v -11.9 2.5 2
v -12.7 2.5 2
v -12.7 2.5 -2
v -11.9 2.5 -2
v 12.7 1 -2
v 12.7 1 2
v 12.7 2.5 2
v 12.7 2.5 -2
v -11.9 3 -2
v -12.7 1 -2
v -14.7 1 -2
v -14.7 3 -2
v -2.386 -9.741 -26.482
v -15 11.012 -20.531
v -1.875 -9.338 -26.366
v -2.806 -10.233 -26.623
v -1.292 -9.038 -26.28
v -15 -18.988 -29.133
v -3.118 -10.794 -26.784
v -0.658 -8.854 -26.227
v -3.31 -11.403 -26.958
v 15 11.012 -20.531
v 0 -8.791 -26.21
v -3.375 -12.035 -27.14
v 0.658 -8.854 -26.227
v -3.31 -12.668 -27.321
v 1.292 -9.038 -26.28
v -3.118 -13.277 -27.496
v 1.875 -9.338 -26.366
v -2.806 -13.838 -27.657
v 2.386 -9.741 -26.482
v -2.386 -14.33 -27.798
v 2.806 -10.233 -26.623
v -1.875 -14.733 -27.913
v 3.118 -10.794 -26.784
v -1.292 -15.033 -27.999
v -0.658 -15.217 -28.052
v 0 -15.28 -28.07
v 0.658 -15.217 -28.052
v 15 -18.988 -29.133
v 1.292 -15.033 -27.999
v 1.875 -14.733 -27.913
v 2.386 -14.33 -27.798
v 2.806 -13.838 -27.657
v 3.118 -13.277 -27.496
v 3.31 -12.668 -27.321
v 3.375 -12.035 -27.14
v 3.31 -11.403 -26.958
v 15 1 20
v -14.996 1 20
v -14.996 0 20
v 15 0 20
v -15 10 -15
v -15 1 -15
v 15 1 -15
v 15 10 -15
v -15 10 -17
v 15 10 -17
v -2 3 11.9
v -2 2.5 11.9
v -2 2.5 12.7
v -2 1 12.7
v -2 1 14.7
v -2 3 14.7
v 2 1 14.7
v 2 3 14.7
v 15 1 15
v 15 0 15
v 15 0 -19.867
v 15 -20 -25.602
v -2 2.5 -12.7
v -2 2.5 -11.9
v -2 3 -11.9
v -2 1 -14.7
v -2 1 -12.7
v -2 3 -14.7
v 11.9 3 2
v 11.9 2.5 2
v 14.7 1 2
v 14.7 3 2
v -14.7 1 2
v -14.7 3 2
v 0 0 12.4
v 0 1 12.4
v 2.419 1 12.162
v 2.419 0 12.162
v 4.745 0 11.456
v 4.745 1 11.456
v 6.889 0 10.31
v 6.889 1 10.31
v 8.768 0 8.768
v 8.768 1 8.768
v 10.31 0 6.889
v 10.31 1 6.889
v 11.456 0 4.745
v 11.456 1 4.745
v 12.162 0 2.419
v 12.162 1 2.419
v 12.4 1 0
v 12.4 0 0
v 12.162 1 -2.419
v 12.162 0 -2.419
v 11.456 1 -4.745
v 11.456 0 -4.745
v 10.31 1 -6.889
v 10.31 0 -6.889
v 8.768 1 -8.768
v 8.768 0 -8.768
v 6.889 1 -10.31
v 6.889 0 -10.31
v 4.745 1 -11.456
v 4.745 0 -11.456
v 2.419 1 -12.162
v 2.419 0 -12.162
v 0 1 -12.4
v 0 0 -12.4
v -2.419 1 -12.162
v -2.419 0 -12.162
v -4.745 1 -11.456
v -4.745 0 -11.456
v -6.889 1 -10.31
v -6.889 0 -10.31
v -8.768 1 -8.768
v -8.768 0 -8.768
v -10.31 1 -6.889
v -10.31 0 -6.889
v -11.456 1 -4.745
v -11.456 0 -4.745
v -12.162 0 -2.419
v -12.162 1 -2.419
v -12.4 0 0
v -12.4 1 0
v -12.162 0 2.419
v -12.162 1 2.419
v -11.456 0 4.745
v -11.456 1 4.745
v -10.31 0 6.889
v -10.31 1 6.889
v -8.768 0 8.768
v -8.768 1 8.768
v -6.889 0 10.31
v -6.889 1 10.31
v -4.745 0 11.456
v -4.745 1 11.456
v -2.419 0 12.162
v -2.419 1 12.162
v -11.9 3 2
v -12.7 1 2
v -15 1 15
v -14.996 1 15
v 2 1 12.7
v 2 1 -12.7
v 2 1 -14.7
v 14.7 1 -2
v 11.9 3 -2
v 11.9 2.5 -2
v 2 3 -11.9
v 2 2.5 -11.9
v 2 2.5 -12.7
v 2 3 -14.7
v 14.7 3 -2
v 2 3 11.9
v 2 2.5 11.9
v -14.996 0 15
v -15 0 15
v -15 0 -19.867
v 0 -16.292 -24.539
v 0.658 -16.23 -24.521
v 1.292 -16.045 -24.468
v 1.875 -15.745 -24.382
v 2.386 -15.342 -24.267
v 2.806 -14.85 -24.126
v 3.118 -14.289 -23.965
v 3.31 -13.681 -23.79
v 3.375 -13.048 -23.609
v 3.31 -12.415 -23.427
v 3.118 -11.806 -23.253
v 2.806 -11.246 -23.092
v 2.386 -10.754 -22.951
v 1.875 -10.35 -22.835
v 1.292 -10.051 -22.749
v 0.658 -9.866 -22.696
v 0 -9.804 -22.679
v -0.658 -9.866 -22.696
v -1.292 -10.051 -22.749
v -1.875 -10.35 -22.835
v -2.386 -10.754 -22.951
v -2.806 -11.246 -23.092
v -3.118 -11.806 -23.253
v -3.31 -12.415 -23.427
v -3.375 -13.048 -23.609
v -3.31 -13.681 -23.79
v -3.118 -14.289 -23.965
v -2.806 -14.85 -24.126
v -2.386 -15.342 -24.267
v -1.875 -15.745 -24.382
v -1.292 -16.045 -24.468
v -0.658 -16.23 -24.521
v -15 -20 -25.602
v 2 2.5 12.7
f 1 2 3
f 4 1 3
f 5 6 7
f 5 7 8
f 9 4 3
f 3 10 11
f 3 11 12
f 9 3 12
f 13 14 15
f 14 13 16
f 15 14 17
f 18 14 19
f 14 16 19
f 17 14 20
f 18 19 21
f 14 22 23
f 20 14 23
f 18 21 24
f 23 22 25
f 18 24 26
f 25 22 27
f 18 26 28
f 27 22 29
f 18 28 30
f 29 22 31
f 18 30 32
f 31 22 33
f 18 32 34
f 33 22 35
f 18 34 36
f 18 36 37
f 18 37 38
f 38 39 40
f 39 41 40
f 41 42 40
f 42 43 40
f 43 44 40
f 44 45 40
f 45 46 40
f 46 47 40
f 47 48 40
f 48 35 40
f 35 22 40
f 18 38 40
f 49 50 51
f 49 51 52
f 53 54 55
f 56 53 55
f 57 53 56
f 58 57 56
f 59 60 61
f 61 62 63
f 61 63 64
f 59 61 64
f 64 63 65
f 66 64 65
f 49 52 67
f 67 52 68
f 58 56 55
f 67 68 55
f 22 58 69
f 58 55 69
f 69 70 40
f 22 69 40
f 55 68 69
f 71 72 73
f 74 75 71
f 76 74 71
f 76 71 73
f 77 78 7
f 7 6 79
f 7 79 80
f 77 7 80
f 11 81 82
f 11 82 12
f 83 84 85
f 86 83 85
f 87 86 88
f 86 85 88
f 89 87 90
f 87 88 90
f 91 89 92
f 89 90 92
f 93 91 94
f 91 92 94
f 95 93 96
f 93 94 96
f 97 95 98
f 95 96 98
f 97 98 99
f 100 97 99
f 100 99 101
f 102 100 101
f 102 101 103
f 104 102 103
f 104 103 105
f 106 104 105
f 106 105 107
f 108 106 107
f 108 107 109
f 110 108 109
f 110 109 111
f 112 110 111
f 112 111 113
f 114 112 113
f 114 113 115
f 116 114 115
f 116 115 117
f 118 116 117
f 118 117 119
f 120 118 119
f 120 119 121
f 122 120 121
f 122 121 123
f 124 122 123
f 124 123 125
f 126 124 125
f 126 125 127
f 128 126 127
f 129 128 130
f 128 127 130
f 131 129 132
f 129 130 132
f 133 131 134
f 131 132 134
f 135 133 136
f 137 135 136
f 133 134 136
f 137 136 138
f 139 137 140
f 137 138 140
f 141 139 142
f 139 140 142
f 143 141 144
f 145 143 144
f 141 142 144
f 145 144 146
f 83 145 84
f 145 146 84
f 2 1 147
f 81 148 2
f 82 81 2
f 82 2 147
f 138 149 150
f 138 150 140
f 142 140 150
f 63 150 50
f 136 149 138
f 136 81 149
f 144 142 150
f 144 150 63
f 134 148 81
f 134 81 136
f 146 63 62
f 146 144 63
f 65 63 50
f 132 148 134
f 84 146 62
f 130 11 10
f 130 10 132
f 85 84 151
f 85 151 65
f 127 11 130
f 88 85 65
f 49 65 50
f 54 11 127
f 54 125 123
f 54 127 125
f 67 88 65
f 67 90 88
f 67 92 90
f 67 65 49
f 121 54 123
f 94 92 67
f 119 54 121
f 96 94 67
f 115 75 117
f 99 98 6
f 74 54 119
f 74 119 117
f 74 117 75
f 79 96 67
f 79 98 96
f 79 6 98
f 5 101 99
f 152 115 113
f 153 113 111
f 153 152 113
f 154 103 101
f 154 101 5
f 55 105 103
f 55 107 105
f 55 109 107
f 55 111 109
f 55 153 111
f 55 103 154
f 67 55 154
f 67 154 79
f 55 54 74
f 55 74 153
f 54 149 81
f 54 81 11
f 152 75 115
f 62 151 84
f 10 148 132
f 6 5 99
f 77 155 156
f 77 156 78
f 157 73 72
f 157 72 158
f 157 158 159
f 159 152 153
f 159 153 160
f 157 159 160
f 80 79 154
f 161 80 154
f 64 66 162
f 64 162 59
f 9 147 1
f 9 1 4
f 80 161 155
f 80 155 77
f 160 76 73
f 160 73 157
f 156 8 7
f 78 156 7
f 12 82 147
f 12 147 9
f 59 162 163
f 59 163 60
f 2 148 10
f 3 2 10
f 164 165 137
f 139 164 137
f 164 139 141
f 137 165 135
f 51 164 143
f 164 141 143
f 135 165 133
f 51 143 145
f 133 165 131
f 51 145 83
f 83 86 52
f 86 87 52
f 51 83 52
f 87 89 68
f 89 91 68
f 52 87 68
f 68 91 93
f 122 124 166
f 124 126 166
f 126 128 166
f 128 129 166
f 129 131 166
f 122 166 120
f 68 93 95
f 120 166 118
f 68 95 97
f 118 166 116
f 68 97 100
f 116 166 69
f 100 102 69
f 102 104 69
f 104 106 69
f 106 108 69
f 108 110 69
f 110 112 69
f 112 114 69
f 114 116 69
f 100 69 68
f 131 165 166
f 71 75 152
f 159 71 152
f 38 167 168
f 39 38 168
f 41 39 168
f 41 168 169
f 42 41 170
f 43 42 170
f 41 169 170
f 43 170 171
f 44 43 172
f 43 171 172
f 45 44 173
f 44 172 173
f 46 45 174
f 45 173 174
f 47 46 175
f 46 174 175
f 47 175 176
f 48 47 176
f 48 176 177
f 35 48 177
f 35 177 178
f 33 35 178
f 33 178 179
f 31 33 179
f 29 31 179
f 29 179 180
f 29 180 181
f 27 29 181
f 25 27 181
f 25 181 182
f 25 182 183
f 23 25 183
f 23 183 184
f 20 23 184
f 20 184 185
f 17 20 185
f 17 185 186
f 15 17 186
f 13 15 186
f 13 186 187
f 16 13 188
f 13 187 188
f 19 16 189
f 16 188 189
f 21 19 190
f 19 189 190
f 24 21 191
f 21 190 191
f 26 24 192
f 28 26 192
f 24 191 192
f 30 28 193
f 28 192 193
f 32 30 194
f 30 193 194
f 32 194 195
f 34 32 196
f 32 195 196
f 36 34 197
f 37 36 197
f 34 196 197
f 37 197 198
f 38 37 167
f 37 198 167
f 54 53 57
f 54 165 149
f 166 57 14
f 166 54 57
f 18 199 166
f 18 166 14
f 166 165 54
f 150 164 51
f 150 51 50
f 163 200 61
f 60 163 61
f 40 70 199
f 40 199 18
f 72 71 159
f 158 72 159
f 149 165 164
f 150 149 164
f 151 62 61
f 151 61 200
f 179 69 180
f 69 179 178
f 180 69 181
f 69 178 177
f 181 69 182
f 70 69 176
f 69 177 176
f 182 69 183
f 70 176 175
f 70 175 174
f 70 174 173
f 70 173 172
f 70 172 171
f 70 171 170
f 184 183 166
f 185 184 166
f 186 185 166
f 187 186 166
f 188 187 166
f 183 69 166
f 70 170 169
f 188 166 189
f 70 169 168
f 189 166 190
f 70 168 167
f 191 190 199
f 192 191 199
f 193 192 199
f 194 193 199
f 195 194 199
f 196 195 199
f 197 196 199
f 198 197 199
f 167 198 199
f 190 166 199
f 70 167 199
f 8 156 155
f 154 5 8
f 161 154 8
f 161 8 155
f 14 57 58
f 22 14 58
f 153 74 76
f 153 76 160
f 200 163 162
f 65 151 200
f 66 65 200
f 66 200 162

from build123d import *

# Parameters (mm, degrees)
SKETCH1_W               = 30
SKETCH1_H               = 30
BOSS_EXTRUDE1_DEPTH     = 1
SKETCH2_R               = 12.4
CUT_EXTRUDE1_DEPTH      = 22.236760582
SKETCH4_W               = 2
SKETCH4_H               = 4
SKETCH4_W_2             = 4
SKETCH4_H_2             = 2
BOSS_EXTRUDE2_DEPTH     = 2
SKETCH5_W               = 4
SKETCH5_H               = 0.5
BOSS_EXTRUDE3_DEPTH     = 0.8
SKETCH6_W               = 4
SKETCH6_H               = 0.5
BOSS_EXTRUDE4_DEPTH     = 0.8
SKETCH7_W               = 4
SKETCH7_H               = 0.5
BOSS_EXTRUDE5_DEPTH     = 0.8
SKETCH8_W               = 4
SKETCH8_H               = 0.5
BOSS_EXTRUDE6_DEPTH     = 0.8
SKETCH11_W              = 38.930666634
SKETCH11_H              = 2
BOSS_EXTRUDE9_DEPTH     = 10
BOSS_EXTRUDE10_DEPTH    = 30
BOSS_EXTRUDE11_DEPTH    = 30
CUT_EXTRUDE2_DEPTH      = 45.684189659
CUT_EXTRUDE2_DEPTH_BACK = 45.684189659
SKETCH14_W              = 8.930666634
SKETCH14_H              = 10
SKETCH15_W              = 29.996322287
SKETCH15_H              = 1
BOSS_EXTRUDE12_DEPTH    = 5
SKETCH20_W              = 30
SKETCH20_H              = 3.6732435
BOSS_EXTRUDE16_DEPTH    = 90
CUT_EXTRUDE3_DEPTH      = 80.886258607
SKETCH23_W              = 30
SKETCH23_H              = 55.569719249
CUT_EXTRUDE5_DEPTH      = 10
SKETCH24_W              = 30
SKETCH24_H              = 3.6732435
BOSS_EXTRUDE17_DEPTH    = 76.2
SKETCH25_W              = 30
SKETCH25_H              = 3.6732435
CUT_EXTRUDE6_DEPTH      = 25.4
SKETCH26_W              = 30
SKETCH26_H              = 3.6732435
BOSS_EXTRUDE18_DEPTH    = 17.8
SKETCH27_W              = 30
SKETCH27_H              = 71.821297676
CUT_EXTRUDE7_DEPTH      = 10
SKETCH28_R              = 3.375
CUT_EXTRUDE8_DEPTH      = 10


with BuildPart() as part:
    # Sketch1 → Boss-Extrude1 (new body)
    with BuildSketch(Plane(origin=(0, 0, 0), x_dir=(1, 0, 0), z_dir=(0, 1, 0))):
        Rectangle(SKETCH1_W, SKETCH1_H)
    extrude(amount=BOSS_EXTRUDE1_DEPTH)

    # Sketch2 → Cut-Extrude1 (cut, through all)
    with BuildSketch(Plane(origin=(0, 1, 0), x_dir=(1, 0, 0), z_dir=(0, 1, 0))):
        with Locations(Location((0, 0, 0), (0, 0, 270))):
            Circle(SKETCH2_R)
    extrude(amount=-CUT_EXTRUDE1_DEPTH, mode=Mode.SUBTRACT)

    # Sketch4 → Boss-Extrude2 (add)
    with BuildSketch(Plane(origin=(0, 1, 0), x_dir=(1, 0, 0), z_dir=(0, 1, 0))):
        with Locations((13.7, 0)):
            Rectangle(SKETCH4_W, SKETCH4_H)
        with Locations((-13.7, 0)):
            Rectangle(SKETCH4_W, SKETCH4_H)
        with Locations((0, 13.7)):
            Rectangle(SKETCH4_W_2, SKETCH4_H_2)
        with Locations((0, -13.7)):
            Rectangle(SKETCH4_W_2, SKETCH4_H_2)
    extrude(amount=BOSS_EXTRUDE2_DEPTH)

    # Sketch5 → Boss-Extrude3 (add)
    with BuildSketch(Plane.ZY.offset(-12.7)):
        with Locations((0, 2.75)):
            Rectangle(SKETCH5_W, SKETCH5_H)
    extrude(amount=BOSS_EXTRUDE3_DEPTH)

    # Sketch6 → Boss-Extrude4 (add)
    with BuildSketch(Plane(origin=(0, 0, 12.7), x_dir=(-1, 0, 0), z_dir=(0, 0, -1))):
        with Locations((0, 2.75)):
            Rectangle(SKETCH6_W, SKETCH6_H)
    extrude(amount=BOSS_EXTRUDE4_DEPTH)

    # Sketch7 → Boss-Extrude5 (add)
    with BuildSketch(Plane(origin=(-12.7, 0, 0), x_dir=(0, 0, -1), z_dir=(1, 0, 0))):
        with Locations((0, 2.75)):
            Rectangle(SKETCH7_W, SKETCH7_H)
    extrude(amount=BOSS_EXTRUDE5_DEPTH)

    # Sketch8 → Boss-Extrude6 (add)
    with BuildSketch(Plane.XY.offset(-12.7)):
        with Locations((0, 2.75)):
            Rectangle(SKETCH8_W, SKETCH8_H)
    extrude(amount=BOSS_EXTRUDE6_DEPTH)

    # Sketch11 → Boss-Extrude9 (add)
    with BuildSketch(Plane.XZ):
        with Locations((4.465333317, -16)):
            Rectangle(SKETCH11_W, SKETCH11_H)
    extrude(amount=-BOSS_EXTRUDE9_DEPTH)



with BuildPart() as body_2:
    # Sketch12 → Boss-Extrude10 (new body)
    with BuildSketch(Plane.ZY.offset(15)):
        Polygon((-17, 10), (-25.602361573, -20), (-30.365256607, -18.634261826), (-21.762895034, 11.365738174), align=None)
    extrude(amount=-BOSS_EXTRUDE10_DEPTH)


with BuildPart() as part_1:
    add(part.part)

    add(body_2.part)  # Boss-Extrude11 merges body 2
    # Sketch13 → Boss-Extrude11 (add)
    with BuildSketch(Plane.ZY.offset(15)):
        Polygon((-17, 0), (-25.021968012, 0), (-21.762895034, 11.365738174), (-17, 10), align=None)
    extrude(amount=-BOSS_EXTRUDE11_DEPTH)

    # Sketch14 → Cut-Extrude2 (cut, two sides: drawn at the far end of the back side and taken through both)
    with BuildSketch(Plane(origin=(0, 0, -17), x_dir=(-1, 0, 0), z_dir=(0, 0, -1)).offset(-CUT_EXTRUDE2_DEPTH_BACK)):
        with Locations((-19.465333317, 5)):
            Rectangle(SKETCH14_W, SKETCH14_H)
    extrude(amount=CUT_EXTRUDE2_DEPTH + CUT_EXTRUDE2_DEPTH_BACK, mode=Mode.SUBTRACT)

    # Sketch15 → Boss-Extrude12 (add)
    with BuildSketch(Plane.XY.offset(15)):
        with Locations((0.001838857, 0.5)):
            Rectangle(SKETCH15_W, SKETCH15_H)
    extrude(amount=BOSS_EXTRUDE12_DEPTH)

    # Sketch20 → Boss-Extrude16 (add)
    with BuildSketch(Plane(origin=(0, -25.264073265, -7.244356434), x_dir=(1, 0, 0), z_dir=(0, -0.9612616959383165, -0.2756373558170081))):
        with Locations((0, -20.934444139)):
            Rectangle(SKETCH20_W, SKETCH20_H)
    extrude(amount=-BOSS_EXTRUDE16_DEPTH)

    # Sketch21 → Cut-Extrude3 (cut, through all)
    with BuildSketch(Plane(origin=(15, 0, 0), x_dir=(0, 0, -1), z_dir=(1, 0, 0))):
        Polygon((21.762895034, 11.365738174), (20.530948276, 11.012483126), (29.133309849, -18.987516874), (30.365256607, -18.634261826), align=None)
    extrude(amount=-CUT_EXTRUDE3_DEPTH, mode=Mode.SUBTRACT)

    # Sketch23 → Cut-Extrude5 (cut)
    with BuildSketch(Plane(origin=(0, 6.276556391, -21.888953415), x_dir=(-1, 0, 0), z_dir=(0, 0.2756373558170081, -0.9612616959383165))):
        with Locations((0, 35.932939211)):
            Rectangle(SKETCH23_W, SKETCH23_H)
    extrude(amount=-CUT_EXTRUDE5_DEPTH, mode=Mode.SUBTRACT)

    # Sketch24 → Boss-Extrude17 (add)
    with BuildSketch(Plane(origin=(0, 7.832436802, 2.245915112), x_dir=(1, 0, 0), z_dir=(0, 0.9612616959383165, 0.2756373558170081))):
        with Locations((0, 20.934444139)):
            Rectangle(SKETCH24_W, SKETCH24_H)
    extrude(amount=BOSS_EXTRUDE17_DEPTH)

    # Sketch25 → Cut-Extrude6 (cut)
    with BuildSketch(Plane(origin=(0, 81.080578032, 23.249481625), x_dir=(1, 0, 0), z_dir=(0, 0.9612616959383165, 0.27563735581700777))):
        with Locations((0, 20.934444139)):
            Rectangle(SKETCH25_W, SKETCH25_H)
    extrude(amount=-CUT_EXTRUDE6_DEPTH, mode=Mode.SUBTRACT)

    # Sketch26 → Boss-Extrude18 (add)
    with BuildSketch(Plane(origin=(0, 56.664530955, 16.248292788), x_dir=(1, 0, 0), z_dir=(0, 0.9612616959383156, 0.2756373558170107))):
        with Locations((0, 20.934444139)):
            Rectangle(SKETCH26_W, SKETCH26_H)
    extrude(amount=BOSS_EXTRUDE18_DEPTH)

    # Sketch27 → Cut-Extrude7 (cut)
    with BuildSketch(Plane(origin=(0, 5.264073265, -18.358005138), x_dir=(1, 0, 0), z_dir=(0, -0.2756373558170081, 0.9612616959383165))):
        with Locations((0, 40.837430748)):
            Rectangle(SKETCH27_W, SKETCH27_H)
    extrude(amount=-CUT_EXTRUDE7_DEPTH, mode=Mode.SUBTRACT)

    # Sketch28 → Cut-Extrude8 (cut)
    with BuildSketch(Plane(origin=(0, 5.264073265, -18.358005138), x_dir=(1, 0, 0), z_dir=(0, -0.27563735581700294, 0.9612616959383178))):
        with Locations(Location((0, -19.05, 0), (0, 0, 270))):
            Circle(SKETCH28_R)
    extrude(amount=-CUT_EXTRUDE8_DEPTH, mode=Mode.SUBTRACT)


solid = part_1.part
